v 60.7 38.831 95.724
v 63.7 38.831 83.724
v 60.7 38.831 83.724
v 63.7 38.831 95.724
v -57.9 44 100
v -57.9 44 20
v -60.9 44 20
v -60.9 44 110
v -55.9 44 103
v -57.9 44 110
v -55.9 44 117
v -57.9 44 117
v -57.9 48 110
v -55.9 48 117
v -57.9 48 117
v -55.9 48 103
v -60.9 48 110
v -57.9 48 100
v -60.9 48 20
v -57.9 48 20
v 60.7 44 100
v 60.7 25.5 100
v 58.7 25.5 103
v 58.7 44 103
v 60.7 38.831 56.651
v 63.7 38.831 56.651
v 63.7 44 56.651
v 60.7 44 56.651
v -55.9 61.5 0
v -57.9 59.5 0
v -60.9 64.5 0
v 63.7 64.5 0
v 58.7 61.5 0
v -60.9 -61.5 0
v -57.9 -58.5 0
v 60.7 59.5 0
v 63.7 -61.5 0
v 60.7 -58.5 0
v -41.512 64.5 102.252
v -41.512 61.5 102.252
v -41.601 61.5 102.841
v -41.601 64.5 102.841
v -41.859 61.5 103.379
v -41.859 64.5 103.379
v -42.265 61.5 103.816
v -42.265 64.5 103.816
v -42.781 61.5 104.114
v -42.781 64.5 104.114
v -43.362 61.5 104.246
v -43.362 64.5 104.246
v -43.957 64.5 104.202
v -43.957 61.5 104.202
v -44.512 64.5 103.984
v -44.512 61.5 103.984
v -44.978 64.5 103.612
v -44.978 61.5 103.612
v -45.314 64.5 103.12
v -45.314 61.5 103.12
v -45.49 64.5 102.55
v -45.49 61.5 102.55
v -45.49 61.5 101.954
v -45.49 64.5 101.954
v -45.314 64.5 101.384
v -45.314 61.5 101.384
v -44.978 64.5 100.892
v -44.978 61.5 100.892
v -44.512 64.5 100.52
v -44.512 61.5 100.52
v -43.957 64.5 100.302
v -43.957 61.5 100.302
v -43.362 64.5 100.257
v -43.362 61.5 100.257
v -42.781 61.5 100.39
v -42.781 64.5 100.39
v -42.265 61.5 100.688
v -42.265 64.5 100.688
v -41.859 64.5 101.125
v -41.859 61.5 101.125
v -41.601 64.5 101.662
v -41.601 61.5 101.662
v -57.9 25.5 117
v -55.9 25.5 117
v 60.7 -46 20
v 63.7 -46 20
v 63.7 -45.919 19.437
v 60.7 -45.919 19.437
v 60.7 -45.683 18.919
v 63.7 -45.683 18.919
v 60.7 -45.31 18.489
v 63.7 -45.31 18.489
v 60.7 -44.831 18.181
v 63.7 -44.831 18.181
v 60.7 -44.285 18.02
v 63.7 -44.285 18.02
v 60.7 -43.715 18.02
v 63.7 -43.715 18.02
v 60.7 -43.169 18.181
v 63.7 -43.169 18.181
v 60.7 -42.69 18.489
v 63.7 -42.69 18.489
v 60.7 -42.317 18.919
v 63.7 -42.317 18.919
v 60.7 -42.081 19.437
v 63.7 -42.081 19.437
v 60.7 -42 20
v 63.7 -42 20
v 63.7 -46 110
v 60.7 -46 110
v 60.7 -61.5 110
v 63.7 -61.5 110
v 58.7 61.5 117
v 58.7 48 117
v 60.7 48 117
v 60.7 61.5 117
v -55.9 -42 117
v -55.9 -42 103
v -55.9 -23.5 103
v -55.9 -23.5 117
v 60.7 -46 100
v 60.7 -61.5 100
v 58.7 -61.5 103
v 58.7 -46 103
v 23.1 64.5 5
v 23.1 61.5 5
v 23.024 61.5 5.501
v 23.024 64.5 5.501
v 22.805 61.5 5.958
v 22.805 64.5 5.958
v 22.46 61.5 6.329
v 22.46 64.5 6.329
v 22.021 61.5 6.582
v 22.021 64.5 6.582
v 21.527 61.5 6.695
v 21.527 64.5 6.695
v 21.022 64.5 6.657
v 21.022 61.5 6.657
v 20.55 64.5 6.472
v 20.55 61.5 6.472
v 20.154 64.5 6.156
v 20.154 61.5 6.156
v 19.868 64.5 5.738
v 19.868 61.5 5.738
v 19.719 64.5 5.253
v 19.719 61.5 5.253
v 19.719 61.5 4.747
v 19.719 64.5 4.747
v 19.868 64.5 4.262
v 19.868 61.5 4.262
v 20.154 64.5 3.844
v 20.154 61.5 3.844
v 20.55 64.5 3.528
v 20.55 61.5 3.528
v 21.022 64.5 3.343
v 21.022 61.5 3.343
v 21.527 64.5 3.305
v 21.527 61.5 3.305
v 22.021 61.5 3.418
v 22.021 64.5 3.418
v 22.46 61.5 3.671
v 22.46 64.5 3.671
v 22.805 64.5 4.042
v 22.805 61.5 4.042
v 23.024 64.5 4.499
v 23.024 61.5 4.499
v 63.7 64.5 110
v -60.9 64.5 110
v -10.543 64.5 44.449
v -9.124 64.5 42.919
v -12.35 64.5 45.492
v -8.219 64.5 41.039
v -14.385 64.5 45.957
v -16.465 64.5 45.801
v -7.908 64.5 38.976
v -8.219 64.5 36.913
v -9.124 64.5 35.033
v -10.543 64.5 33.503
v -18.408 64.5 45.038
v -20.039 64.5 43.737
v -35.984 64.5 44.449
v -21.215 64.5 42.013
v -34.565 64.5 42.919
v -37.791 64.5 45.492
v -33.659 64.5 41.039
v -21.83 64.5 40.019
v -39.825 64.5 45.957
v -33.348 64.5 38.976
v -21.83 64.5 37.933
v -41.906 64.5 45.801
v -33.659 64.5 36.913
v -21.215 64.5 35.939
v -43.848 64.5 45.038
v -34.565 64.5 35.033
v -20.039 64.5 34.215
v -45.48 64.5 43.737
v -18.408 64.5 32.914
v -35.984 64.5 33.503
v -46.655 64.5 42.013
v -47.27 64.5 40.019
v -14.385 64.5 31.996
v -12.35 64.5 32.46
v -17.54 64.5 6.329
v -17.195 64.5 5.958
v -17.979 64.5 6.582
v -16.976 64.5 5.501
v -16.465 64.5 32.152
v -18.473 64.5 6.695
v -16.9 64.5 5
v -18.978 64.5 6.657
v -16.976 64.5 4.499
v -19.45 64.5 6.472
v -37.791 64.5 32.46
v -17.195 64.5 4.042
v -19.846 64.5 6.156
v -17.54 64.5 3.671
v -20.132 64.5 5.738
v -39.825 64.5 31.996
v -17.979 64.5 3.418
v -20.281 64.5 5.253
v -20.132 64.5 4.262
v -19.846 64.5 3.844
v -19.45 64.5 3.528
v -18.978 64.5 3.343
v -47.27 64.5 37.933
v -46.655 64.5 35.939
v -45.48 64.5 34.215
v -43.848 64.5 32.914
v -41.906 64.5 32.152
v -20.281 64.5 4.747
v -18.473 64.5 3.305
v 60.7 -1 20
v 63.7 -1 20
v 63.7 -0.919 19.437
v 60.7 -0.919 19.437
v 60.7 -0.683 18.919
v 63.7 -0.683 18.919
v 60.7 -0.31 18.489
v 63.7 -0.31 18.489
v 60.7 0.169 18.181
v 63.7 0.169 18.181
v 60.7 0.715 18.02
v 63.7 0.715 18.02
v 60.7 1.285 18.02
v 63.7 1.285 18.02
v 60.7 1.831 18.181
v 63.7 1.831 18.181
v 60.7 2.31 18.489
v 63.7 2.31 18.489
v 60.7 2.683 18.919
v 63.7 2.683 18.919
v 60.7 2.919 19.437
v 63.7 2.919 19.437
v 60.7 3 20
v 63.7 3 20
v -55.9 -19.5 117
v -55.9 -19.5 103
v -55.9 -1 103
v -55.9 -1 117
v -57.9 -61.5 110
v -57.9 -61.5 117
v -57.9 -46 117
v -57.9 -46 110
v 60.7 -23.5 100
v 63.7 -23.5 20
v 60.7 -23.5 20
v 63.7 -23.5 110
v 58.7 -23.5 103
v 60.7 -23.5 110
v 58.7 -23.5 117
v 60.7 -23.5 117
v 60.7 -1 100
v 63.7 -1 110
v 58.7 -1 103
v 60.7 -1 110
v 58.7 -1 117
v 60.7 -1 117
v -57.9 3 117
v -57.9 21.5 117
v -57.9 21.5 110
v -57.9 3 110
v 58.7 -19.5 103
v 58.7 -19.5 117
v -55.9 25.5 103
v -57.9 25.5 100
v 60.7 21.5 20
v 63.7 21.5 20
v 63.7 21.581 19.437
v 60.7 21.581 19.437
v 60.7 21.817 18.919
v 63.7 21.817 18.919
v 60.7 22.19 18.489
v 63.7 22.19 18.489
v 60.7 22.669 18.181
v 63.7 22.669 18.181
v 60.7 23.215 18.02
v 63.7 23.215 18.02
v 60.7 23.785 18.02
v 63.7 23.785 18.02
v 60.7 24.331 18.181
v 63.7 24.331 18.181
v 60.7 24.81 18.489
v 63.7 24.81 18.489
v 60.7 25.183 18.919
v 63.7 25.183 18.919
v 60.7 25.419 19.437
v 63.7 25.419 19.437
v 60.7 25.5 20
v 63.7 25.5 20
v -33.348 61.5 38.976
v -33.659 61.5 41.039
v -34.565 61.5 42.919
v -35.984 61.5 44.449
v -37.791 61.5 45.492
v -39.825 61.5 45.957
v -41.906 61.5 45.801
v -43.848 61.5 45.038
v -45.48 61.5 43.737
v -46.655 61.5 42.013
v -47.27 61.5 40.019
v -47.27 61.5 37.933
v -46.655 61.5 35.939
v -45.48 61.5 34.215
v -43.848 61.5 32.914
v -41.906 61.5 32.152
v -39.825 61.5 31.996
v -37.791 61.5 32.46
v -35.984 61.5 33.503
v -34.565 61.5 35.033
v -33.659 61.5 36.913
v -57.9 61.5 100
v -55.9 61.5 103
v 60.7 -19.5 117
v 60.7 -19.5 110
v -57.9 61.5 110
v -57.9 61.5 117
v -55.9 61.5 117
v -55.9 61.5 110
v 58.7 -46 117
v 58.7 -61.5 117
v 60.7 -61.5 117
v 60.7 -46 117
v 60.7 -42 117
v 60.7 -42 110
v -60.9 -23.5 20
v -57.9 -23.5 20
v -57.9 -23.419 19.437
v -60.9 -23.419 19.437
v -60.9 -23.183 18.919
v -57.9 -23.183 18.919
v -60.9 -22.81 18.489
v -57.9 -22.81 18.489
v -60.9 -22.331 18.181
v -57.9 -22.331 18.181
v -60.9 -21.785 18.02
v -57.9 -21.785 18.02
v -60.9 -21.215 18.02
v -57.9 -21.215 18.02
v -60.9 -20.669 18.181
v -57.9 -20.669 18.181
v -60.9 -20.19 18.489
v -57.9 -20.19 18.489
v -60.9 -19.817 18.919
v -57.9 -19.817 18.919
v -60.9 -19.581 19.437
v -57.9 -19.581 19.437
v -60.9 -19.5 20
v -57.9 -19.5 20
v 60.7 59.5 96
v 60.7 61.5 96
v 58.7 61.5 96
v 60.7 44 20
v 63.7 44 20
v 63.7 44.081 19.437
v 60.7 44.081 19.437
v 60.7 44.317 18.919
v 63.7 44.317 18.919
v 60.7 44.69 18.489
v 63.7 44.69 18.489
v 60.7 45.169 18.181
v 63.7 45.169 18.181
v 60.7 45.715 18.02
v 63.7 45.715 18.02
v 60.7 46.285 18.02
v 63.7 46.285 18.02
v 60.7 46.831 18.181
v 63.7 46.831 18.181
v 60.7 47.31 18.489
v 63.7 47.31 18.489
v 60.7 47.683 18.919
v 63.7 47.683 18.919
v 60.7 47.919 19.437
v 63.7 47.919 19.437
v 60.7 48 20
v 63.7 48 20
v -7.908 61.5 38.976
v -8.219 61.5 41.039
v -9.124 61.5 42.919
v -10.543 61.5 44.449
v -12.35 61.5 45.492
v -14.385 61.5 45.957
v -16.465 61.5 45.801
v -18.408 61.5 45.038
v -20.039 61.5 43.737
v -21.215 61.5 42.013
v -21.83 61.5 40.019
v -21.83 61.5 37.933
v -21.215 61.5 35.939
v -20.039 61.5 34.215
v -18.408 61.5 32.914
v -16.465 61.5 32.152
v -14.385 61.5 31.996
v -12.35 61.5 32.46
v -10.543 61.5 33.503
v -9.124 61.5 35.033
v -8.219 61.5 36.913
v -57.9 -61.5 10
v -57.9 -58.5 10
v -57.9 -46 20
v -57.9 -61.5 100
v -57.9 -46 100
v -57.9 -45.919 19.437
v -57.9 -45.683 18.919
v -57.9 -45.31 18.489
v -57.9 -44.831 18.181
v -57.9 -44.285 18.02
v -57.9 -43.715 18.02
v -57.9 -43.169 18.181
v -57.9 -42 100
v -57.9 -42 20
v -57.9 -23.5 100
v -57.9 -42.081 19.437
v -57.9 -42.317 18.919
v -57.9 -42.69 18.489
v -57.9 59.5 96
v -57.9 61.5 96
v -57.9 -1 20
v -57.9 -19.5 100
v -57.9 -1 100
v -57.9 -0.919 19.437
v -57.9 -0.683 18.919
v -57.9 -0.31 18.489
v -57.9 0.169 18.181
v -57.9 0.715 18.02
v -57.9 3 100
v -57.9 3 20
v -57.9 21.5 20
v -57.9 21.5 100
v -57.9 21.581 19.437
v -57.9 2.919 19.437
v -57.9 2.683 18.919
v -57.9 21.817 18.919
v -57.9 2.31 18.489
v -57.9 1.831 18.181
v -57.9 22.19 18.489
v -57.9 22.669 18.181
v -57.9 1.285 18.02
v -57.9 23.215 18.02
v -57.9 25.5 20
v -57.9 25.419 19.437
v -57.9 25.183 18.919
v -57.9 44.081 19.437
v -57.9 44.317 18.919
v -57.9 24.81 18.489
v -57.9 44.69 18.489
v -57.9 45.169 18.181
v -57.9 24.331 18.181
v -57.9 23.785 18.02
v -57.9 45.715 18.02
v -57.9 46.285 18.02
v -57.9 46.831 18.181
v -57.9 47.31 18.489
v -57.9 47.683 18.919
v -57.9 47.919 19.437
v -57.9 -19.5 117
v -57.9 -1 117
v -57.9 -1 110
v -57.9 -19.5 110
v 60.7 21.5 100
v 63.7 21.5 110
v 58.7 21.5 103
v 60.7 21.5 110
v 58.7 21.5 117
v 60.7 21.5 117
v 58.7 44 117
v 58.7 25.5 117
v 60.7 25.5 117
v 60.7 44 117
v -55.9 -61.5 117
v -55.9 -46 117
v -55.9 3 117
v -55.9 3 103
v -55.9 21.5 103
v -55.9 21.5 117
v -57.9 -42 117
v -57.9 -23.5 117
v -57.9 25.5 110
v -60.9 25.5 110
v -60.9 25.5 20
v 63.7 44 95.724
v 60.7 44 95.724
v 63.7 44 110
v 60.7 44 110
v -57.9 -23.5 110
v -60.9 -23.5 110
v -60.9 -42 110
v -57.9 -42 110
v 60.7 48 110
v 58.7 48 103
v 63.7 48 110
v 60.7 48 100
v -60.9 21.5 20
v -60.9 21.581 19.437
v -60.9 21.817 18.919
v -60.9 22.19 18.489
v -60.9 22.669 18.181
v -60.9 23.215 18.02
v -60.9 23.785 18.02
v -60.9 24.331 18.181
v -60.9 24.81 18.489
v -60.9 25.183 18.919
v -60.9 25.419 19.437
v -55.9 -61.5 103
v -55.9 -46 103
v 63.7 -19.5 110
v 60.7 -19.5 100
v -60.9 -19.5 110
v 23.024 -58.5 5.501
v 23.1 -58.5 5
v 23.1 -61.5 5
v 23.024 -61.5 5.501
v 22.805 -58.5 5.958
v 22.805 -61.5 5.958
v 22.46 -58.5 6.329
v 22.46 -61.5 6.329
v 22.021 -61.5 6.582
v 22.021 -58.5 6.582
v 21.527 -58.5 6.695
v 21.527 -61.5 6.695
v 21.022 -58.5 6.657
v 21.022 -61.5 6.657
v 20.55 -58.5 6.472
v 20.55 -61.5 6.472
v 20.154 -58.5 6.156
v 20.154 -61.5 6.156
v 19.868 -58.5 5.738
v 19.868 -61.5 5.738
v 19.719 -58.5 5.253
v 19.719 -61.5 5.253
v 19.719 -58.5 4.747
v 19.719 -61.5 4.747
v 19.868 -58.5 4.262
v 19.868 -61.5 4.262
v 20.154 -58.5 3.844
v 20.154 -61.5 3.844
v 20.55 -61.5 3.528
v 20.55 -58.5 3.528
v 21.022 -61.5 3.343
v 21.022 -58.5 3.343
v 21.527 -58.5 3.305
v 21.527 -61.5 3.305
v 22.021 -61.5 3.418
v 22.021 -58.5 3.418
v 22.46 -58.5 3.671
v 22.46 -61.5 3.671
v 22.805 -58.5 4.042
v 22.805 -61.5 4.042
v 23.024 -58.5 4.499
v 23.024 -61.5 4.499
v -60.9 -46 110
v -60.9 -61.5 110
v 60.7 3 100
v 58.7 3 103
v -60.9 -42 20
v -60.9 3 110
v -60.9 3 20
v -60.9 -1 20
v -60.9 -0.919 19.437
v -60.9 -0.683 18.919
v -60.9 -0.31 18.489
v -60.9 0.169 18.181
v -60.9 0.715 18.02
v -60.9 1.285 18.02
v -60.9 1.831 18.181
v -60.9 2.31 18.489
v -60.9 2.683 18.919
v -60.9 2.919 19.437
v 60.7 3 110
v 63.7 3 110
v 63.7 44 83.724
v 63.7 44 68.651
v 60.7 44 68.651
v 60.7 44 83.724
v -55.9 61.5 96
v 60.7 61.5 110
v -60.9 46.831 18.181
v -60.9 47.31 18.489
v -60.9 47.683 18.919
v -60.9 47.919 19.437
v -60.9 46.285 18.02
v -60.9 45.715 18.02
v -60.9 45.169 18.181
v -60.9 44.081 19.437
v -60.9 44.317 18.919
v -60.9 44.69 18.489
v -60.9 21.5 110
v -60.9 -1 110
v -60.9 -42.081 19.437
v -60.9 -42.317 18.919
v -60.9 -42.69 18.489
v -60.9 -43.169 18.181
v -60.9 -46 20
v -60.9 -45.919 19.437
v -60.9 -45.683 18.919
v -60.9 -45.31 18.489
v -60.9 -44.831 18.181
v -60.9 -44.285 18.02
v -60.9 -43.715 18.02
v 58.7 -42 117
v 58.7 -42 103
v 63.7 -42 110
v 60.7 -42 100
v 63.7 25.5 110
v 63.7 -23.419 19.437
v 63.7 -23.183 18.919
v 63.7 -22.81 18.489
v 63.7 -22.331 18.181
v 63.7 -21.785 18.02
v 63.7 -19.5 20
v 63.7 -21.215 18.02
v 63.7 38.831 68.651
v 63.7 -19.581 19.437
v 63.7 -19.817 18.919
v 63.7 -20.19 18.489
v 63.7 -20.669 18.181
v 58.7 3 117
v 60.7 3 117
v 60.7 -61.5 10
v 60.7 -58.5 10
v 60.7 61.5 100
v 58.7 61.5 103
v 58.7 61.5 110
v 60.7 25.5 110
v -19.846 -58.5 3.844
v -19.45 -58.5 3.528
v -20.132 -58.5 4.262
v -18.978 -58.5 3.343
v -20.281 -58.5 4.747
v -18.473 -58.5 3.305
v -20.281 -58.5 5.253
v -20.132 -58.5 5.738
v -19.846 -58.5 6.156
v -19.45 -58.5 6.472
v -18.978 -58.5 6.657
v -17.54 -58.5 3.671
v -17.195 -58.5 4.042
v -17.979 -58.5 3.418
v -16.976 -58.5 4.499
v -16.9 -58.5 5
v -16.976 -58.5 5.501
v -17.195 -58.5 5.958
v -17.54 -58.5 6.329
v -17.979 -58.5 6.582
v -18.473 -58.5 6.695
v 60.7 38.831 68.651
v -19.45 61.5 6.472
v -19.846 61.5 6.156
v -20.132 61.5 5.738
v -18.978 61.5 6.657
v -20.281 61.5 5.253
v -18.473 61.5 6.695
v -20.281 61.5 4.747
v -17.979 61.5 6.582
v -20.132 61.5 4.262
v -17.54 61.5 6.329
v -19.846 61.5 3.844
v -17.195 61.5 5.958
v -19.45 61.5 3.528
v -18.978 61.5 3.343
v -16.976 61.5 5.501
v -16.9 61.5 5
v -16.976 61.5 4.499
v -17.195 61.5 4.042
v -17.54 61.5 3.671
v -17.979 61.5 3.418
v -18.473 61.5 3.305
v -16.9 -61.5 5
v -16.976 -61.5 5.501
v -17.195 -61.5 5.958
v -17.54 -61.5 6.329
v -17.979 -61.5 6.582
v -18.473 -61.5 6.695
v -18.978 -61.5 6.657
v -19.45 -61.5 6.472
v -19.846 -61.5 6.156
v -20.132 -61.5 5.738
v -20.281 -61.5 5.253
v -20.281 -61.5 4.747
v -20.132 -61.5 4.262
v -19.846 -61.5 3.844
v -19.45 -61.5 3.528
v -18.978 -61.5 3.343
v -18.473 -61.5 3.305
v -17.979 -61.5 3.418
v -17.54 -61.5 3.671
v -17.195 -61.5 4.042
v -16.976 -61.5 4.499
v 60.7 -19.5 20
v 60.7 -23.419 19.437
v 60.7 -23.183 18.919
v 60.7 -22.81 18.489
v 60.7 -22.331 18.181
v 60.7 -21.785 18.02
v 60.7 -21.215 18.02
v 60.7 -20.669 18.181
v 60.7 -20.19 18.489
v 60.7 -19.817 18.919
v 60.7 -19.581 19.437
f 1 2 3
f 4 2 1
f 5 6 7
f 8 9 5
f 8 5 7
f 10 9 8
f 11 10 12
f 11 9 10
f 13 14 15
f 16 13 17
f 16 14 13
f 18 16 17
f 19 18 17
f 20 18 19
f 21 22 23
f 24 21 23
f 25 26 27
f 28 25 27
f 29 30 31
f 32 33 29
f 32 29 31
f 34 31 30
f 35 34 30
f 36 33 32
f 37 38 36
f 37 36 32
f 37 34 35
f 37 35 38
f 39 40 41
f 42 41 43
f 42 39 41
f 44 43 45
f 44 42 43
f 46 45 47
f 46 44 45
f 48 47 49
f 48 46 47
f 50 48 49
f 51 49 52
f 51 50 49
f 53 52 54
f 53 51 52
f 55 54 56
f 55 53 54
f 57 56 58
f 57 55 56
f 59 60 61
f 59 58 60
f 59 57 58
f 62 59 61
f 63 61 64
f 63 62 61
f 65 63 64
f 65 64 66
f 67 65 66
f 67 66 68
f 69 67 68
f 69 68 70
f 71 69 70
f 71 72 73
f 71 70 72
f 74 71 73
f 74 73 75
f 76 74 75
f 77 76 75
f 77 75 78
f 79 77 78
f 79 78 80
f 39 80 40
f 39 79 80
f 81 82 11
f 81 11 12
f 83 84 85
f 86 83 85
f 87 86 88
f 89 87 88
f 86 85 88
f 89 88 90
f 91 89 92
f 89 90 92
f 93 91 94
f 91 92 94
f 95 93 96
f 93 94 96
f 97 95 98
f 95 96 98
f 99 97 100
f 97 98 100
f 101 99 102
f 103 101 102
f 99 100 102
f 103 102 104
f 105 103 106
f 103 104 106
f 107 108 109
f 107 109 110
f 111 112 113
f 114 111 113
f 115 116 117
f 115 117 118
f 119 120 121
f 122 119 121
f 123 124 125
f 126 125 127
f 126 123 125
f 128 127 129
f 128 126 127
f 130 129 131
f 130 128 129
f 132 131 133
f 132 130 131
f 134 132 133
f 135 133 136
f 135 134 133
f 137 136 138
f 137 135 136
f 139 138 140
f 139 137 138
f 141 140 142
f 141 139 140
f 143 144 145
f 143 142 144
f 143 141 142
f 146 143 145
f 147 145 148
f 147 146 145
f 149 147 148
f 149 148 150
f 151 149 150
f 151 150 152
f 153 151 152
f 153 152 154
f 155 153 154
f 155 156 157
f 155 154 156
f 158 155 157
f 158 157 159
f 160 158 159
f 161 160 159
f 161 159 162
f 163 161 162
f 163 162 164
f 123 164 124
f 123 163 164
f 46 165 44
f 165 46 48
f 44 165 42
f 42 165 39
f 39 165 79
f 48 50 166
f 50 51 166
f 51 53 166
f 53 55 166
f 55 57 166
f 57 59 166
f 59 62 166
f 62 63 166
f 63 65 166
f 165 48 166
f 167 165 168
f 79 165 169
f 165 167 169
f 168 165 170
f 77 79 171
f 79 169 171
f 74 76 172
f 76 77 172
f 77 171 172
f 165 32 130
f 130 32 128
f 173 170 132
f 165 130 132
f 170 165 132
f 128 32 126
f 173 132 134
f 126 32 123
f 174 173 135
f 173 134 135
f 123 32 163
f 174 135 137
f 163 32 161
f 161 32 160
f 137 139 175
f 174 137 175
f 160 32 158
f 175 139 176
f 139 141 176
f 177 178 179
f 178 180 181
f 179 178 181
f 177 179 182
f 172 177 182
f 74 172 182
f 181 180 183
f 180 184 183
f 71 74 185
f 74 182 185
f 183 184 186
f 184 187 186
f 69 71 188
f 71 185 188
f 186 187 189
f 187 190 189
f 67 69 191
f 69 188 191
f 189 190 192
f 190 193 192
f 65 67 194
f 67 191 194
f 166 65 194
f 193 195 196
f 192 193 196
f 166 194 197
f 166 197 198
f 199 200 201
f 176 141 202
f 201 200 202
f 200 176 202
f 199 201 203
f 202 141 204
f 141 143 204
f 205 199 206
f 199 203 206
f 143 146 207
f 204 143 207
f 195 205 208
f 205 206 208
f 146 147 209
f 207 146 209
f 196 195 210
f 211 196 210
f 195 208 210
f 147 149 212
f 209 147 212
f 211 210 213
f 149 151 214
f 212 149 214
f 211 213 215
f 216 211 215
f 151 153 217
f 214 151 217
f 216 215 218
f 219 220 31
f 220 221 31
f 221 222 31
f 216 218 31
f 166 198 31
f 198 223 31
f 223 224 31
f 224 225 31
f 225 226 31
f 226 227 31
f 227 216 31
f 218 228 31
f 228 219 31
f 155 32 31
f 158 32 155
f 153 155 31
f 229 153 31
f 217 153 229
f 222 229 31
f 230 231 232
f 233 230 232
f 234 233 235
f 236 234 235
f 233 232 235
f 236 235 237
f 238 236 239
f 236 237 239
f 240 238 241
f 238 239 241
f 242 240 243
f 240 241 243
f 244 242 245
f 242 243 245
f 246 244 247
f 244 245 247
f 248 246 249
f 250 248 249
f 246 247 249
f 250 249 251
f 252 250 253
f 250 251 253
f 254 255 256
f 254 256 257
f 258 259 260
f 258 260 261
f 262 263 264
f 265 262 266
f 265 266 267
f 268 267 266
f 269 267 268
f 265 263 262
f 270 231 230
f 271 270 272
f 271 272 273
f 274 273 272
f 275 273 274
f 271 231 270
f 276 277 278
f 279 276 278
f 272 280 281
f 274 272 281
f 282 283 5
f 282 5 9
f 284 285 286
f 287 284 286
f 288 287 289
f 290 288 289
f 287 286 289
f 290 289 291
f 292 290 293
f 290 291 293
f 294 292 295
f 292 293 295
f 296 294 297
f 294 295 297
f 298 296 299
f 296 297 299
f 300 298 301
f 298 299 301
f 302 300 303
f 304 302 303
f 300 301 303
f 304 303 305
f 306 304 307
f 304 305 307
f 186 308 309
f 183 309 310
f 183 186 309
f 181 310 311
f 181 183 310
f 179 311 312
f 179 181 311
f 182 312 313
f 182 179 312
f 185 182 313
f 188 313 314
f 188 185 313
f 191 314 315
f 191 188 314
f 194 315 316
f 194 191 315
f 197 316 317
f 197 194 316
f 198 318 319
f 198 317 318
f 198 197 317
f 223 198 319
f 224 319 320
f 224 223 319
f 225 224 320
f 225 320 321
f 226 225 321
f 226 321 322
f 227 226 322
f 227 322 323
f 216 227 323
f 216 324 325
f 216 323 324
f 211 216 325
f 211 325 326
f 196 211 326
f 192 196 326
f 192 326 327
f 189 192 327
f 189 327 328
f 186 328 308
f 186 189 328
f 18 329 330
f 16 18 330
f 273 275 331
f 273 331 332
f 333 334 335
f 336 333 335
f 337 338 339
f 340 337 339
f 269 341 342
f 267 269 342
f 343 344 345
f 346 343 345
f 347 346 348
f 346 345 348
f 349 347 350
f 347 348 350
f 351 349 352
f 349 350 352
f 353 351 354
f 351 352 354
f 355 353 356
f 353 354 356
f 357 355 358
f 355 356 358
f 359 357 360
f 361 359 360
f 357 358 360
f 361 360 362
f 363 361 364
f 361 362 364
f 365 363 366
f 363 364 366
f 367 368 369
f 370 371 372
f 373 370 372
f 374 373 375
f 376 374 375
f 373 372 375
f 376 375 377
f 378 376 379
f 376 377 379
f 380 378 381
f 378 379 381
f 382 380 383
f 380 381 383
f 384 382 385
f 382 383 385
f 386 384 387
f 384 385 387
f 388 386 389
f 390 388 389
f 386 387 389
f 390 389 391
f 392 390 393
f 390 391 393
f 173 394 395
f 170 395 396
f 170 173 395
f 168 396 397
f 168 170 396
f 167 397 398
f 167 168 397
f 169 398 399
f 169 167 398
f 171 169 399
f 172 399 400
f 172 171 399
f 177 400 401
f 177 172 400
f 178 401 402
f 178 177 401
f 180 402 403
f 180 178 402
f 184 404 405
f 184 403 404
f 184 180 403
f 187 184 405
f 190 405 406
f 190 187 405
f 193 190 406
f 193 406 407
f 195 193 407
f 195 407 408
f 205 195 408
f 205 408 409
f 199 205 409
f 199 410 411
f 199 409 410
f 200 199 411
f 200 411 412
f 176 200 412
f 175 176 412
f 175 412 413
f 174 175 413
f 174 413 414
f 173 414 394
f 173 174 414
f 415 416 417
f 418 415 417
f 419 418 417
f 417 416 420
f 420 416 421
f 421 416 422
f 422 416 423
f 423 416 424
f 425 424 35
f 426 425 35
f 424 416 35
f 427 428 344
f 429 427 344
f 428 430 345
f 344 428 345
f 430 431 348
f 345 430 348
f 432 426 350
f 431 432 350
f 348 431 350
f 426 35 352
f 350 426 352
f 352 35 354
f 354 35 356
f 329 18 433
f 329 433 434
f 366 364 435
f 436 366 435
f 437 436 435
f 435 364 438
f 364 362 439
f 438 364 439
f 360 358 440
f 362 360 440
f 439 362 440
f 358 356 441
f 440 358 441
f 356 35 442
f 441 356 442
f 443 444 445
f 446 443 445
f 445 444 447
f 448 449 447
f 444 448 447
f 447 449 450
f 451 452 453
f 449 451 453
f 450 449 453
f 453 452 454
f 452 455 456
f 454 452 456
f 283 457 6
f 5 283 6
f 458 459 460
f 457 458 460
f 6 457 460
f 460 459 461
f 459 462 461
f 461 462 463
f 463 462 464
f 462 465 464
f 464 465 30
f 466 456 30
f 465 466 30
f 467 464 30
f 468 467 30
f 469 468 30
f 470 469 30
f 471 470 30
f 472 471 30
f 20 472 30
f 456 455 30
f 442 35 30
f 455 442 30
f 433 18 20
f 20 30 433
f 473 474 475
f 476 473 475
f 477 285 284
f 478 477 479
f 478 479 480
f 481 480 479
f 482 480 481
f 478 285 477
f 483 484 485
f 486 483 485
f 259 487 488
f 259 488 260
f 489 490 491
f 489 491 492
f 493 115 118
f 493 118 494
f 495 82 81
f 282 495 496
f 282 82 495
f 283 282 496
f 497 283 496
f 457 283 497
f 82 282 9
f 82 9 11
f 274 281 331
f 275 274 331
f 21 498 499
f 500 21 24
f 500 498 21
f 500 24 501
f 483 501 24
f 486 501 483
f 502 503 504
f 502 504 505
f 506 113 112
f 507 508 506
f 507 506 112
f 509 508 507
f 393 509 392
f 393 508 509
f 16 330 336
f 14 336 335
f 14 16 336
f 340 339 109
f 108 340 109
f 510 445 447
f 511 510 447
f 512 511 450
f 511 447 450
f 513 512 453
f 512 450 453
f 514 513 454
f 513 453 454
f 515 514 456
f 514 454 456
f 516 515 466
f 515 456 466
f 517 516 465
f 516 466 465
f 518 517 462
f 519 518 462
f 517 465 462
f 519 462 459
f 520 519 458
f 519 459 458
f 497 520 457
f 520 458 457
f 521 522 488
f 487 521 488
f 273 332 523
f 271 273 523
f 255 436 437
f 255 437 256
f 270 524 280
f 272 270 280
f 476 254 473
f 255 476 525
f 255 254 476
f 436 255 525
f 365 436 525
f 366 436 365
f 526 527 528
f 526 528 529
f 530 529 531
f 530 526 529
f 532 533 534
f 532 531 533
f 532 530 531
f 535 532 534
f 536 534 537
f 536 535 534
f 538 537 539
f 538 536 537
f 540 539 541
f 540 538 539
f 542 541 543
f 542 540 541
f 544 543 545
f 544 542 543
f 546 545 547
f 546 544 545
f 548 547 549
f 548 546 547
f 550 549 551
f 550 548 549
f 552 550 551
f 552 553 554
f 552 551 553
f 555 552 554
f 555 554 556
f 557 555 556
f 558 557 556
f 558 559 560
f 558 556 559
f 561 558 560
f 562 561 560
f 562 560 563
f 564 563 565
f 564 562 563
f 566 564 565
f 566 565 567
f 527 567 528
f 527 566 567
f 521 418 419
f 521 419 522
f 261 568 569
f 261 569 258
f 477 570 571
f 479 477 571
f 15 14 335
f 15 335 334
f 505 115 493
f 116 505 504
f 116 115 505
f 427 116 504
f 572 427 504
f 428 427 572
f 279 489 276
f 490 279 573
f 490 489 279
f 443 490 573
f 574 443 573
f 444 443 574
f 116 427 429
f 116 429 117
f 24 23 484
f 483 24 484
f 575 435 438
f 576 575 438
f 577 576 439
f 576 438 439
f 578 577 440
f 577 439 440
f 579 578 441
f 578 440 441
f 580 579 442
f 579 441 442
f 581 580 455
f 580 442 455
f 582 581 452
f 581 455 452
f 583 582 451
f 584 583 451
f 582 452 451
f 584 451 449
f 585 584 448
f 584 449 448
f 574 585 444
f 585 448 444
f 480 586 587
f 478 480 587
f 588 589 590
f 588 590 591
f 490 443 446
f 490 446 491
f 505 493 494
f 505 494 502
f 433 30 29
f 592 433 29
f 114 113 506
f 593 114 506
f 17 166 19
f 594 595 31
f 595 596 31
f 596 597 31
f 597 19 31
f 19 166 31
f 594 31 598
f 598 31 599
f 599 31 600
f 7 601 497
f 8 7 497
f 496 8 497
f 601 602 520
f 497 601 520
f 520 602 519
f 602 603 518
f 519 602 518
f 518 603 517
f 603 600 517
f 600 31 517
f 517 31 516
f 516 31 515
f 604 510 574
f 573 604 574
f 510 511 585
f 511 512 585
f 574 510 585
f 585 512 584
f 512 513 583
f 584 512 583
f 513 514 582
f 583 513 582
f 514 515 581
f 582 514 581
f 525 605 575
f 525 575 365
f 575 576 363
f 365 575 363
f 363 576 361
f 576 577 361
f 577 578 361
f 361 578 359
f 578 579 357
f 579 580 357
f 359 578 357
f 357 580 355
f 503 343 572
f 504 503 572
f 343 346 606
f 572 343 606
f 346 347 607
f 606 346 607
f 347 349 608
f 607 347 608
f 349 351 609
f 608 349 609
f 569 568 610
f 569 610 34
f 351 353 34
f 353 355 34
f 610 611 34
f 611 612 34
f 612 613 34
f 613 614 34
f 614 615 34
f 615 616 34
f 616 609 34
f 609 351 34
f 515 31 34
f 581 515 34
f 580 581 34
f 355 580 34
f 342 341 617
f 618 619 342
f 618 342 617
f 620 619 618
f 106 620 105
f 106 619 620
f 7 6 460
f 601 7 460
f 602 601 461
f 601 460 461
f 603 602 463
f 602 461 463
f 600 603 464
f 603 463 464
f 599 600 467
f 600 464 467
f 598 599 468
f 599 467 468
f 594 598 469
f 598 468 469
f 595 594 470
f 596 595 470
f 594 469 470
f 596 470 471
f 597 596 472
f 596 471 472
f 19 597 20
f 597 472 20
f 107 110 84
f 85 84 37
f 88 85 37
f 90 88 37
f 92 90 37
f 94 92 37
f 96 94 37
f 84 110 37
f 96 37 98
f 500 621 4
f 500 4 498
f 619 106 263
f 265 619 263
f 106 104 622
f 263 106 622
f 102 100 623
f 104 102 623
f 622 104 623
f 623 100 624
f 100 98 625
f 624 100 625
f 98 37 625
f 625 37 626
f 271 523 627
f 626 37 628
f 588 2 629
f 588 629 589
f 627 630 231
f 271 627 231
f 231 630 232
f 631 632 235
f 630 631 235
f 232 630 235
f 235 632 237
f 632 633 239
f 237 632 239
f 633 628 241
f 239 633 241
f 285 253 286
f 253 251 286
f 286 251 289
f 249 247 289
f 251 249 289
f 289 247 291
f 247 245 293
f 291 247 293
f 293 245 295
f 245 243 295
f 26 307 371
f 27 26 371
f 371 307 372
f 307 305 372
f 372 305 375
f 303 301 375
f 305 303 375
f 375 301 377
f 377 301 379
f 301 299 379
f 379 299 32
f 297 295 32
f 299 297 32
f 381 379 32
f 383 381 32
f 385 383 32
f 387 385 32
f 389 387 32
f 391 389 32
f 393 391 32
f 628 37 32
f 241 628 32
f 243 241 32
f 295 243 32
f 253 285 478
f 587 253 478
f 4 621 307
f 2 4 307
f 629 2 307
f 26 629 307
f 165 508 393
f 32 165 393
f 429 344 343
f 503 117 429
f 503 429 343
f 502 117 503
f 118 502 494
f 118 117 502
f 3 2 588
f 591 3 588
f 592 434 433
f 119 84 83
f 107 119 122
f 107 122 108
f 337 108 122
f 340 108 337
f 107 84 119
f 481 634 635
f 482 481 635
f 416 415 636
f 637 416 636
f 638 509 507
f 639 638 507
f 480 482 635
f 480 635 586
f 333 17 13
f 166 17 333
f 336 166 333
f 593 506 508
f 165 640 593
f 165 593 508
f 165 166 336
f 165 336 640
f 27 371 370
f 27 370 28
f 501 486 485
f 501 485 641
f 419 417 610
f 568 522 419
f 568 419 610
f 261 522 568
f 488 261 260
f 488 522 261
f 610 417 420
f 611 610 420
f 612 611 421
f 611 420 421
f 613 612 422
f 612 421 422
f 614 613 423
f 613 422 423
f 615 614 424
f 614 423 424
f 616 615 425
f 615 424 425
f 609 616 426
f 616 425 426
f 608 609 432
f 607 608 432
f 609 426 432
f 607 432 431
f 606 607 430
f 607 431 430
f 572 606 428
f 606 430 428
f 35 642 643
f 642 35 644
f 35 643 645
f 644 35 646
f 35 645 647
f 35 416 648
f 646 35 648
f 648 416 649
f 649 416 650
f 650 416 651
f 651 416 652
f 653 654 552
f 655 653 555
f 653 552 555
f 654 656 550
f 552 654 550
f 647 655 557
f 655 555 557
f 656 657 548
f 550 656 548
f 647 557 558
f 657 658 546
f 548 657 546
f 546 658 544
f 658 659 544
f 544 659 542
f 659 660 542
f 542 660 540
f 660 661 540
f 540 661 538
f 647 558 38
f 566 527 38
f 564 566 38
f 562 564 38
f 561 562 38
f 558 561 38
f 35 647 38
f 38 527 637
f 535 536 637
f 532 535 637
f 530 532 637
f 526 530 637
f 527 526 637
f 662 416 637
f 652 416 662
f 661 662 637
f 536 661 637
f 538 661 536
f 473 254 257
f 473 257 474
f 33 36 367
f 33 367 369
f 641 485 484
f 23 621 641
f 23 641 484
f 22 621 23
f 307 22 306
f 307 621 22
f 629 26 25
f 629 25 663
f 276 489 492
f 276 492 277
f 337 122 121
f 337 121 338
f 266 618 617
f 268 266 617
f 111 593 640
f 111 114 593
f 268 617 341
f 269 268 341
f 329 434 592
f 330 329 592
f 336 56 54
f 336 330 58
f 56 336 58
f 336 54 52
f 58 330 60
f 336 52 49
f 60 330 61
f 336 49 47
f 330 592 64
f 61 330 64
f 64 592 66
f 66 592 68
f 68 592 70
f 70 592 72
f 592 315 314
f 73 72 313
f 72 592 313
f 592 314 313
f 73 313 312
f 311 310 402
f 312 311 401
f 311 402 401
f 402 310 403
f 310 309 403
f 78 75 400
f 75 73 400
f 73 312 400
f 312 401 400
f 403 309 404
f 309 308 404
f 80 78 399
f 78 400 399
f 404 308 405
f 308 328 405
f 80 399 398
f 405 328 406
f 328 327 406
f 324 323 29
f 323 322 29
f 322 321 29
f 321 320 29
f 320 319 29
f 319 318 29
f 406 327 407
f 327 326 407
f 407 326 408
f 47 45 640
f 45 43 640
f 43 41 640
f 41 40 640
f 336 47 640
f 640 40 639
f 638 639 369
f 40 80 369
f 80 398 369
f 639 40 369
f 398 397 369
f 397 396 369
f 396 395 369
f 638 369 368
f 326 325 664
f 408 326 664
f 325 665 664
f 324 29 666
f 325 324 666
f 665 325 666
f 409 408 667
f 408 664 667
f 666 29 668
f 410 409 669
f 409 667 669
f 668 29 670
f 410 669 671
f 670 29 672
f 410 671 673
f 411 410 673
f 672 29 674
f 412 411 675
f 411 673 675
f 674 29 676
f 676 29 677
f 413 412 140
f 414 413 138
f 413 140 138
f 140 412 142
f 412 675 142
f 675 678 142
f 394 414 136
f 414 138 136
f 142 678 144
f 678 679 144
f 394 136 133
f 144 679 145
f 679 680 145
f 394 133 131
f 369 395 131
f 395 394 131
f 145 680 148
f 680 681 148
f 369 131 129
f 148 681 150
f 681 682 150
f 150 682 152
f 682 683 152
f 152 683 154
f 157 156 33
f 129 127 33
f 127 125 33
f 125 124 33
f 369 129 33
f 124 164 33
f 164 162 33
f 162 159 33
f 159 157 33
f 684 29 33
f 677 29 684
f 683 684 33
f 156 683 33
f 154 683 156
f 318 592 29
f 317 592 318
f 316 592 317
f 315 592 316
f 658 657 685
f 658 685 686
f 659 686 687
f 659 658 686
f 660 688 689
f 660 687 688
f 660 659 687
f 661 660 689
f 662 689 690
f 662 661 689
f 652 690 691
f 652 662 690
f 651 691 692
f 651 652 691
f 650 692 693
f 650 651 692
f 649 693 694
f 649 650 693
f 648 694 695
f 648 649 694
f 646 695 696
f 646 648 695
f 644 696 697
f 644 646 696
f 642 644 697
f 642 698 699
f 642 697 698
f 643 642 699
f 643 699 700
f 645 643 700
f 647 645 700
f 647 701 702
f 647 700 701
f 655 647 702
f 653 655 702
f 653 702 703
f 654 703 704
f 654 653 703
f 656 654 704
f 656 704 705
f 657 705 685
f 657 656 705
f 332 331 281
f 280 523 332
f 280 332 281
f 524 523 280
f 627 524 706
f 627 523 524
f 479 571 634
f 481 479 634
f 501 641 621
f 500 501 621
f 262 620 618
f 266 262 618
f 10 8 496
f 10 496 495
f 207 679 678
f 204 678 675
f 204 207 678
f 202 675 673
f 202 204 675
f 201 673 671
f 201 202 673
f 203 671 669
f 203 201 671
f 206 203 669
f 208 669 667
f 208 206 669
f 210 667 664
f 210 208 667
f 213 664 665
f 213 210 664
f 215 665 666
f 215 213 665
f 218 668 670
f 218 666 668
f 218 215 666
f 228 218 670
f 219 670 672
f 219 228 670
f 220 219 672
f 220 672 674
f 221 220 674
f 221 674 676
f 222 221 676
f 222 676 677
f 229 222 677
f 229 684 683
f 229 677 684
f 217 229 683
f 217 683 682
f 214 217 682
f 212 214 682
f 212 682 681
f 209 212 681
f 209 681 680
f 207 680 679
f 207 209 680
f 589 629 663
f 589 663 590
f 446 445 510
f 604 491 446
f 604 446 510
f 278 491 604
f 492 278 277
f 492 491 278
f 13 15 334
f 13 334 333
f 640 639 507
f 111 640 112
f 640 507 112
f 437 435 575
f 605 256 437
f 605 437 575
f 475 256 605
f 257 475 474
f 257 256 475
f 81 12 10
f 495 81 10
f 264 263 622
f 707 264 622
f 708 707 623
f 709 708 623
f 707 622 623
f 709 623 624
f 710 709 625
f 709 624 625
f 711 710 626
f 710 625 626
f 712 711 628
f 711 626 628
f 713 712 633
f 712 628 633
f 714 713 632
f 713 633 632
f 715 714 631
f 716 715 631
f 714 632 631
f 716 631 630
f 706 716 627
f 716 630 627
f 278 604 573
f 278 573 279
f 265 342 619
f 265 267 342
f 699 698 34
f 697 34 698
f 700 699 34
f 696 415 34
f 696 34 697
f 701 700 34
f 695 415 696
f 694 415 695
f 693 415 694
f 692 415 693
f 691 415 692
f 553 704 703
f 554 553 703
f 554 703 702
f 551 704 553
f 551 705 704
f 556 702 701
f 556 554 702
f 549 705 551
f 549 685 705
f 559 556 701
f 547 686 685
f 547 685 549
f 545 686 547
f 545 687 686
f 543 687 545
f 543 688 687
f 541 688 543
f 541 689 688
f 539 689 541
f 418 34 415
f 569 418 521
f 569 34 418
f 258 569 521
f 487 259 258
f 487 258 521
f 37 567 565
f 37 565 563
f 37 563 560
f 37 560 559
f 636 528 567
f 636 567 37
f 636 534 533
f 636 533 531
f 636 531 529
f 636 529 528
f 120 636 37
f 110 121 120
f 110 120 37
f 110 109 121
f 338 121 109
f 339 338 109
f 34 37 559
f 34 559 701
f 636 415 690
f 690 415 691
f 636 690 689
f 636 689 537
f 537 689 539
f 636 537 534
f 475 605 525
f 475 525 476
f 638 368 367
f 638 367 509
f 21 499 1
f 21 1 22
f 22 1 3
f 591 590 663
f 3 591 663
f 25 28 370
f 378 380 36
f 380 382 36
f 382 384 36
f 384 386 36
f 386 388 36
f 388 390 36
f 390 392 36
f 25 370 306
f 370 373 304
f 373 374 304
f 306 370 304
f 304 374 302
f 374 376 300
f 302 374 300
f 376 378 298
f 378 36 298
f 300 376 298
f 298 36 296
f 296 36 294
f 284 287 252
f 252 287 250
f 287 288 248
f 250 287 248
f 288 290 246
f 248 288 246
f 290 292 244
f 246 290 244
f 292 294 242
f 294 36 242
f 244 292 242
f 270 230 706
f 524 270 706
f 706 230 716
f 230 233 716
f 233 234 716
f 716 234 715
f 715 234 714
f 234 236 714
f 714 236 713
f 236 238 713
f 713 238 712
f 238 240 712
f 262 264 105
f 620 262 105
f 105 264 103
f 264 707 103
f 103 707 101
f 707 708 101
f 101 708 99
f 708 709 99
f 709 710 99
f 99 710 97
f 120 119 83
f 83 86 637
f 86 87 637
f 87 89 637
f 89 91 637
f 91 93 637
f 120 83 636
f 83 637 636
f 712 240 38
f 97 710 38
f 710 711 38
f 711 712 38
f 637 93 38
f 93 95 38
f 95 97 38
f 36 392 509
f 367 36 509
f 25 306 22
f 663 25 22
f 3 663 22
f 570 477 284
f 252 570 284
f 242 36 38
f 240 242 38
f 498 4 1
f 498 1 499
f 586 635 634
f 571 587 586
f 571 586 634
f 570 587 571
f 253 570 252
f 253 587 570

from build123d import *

# Parameters (mm, degrees)
PAD_DEPTH           = 110
PAD001_DEPTH        = 96
SKETCH003_W         = 118.6
SKETCH003_H         = 10
PAD002_DEPTH        = 3
PAD003_DEPTH        = 123
POCKET001_DEPTH     = 124.601
LINEARPATTERN_COUNT = 5
LINEARPATTERN_PITCH = 22.5
SKETCH012_W         = 6
SKETCH012_H         = 12
POCKET_DEPTH        = 5
SKETCH013_R         = 1.7
POCKET004_DEPTH     = 126.001
SKETCH014_R         = 7
SKETCH014_R_2       = 2
POCKET005_DEPTH     = 5


with BuildPart() as part:
    # Sketch → Pad (new body)
    with BuildSketch(Plane.XY):
        Polygon((62.3, 64.5), (-62.3, 64.5), (-62.3, -61.5), (-59.3, -61.5), (-59.3, 61.5), (59.3, 61.5), (59.3, -61.5), (62.3, -61.5), align=None)
    extrude(amount=PAD_DEPTH)

    # Sketch001 → Pad001 (join)
    with BuildSketch(Plane.XY):
        Polygon((-59.3, 59.5), (-57.3, 61.5), (-59.3, 61.5), align=None)
    pad001 = extrude(amount=PAD001_DEPTH)

    # Mirrored: Pad001 across YZ
    add(pad001.mirror(Plane.YZ))

    # Sketch003 (on DatumPlane) → Pad002 (join)
    with BuildSketch(Plane.XZ.offset(61.5)):
        with Locations((0, 5)):
            Rectangle(SKETCH003_W, SKETCH003_H)
    extrude(amount=-PAD002_DEPTH)

    # Sketch004 (on DatumPlane) → Pad003 (join)
    with BuildSketch(Plane.XZ.offset(61.5)):
        Polygon((-57.3, 117), (-59.3, 117), (-59.3, 100), (-57.3, 103), align=None)
        Polygon((57.3, 103), (57.3, 117), (59.3, 117), (59.3, 100), align=None)
    extrude(amount=-PAD003_DEPTH)

    # Sketch009 (on DatumPlane) → Pocket001 (cut, through all)
    with BuildSketch(Plane.YZ.offset(62.3)):
        with BuildLine():
            Line((-46, 20), (-46, 243))
            ThreePointArc((-42, 243), (-44, 245), (-46, 243))
            Line((-42, 243), (-42, 20))
            ThreePointArc((-46, 20), (-44, 18), (-42, 20))
        make_face()
    pocket001 = extrude(amount=-POCKET001_DEPTH, mode=Mode.SUBTRACT)

    # LinearPattern: Pocket001 ×5
    with Locations(*[(0, i * LINEARPATTERN_PITCH, 0) for i in range(1, LINEARPATTERN_COUNT)]):
        add(pocket001, mode=Mode.SUBTRACT)

    # Sketch012 (on DatumPlane) → Pocket (cut)
    with BuildSketch(Plane.YZ.offset(62.3)):
        with Locations((41.830656, 89.723986)):
            Rectangle(SKETCH012_W, SKETCH012_H)
        with Locations((41.830656, 62.651357)):
            Rectangle(SKETCH012_W, SKETCH012_H)
    extrude(amount=-POCKET_DEPTH, mode=Mode.SUBTRACT)

    # Sketch013 (on DatumPlane) → Pocket004 (cut, through all)
    with BuildSketch(Plane.XZ.offset(-64.5)):
        with Locations((20, 5)):
            Circle(SKETCH013_R)
        with Locations((-20, 5)):
            Circle(SKETCH013_R)
    extrude(amount=POCKET004_DEPTH, mode=Mode.SUBTRACT)

    # Sketch014 (on DatumPlane) → Pocket005 (cut)
    with BuildSketch(Plane.XZ.offset(-64.5)):
        with Locations((-16.307726, 38.976202)):
            Circle(SKETCH014_R)
        with Locations((-41.748446, 38.976202)):
            Circle(SKETCH014_R)
        with Locations((-44.911871, 102.251883)):
            Circle(SKETCH014_R_2)
    extrude(amount=POCKET005_DEPTH, mode=Mode.SUBTRACT)


with BuildPart() as part_1:
    # Body placement: moved
    add(part.part.moved(Location((1.4, 0, 0))))


solid = part_1.part
